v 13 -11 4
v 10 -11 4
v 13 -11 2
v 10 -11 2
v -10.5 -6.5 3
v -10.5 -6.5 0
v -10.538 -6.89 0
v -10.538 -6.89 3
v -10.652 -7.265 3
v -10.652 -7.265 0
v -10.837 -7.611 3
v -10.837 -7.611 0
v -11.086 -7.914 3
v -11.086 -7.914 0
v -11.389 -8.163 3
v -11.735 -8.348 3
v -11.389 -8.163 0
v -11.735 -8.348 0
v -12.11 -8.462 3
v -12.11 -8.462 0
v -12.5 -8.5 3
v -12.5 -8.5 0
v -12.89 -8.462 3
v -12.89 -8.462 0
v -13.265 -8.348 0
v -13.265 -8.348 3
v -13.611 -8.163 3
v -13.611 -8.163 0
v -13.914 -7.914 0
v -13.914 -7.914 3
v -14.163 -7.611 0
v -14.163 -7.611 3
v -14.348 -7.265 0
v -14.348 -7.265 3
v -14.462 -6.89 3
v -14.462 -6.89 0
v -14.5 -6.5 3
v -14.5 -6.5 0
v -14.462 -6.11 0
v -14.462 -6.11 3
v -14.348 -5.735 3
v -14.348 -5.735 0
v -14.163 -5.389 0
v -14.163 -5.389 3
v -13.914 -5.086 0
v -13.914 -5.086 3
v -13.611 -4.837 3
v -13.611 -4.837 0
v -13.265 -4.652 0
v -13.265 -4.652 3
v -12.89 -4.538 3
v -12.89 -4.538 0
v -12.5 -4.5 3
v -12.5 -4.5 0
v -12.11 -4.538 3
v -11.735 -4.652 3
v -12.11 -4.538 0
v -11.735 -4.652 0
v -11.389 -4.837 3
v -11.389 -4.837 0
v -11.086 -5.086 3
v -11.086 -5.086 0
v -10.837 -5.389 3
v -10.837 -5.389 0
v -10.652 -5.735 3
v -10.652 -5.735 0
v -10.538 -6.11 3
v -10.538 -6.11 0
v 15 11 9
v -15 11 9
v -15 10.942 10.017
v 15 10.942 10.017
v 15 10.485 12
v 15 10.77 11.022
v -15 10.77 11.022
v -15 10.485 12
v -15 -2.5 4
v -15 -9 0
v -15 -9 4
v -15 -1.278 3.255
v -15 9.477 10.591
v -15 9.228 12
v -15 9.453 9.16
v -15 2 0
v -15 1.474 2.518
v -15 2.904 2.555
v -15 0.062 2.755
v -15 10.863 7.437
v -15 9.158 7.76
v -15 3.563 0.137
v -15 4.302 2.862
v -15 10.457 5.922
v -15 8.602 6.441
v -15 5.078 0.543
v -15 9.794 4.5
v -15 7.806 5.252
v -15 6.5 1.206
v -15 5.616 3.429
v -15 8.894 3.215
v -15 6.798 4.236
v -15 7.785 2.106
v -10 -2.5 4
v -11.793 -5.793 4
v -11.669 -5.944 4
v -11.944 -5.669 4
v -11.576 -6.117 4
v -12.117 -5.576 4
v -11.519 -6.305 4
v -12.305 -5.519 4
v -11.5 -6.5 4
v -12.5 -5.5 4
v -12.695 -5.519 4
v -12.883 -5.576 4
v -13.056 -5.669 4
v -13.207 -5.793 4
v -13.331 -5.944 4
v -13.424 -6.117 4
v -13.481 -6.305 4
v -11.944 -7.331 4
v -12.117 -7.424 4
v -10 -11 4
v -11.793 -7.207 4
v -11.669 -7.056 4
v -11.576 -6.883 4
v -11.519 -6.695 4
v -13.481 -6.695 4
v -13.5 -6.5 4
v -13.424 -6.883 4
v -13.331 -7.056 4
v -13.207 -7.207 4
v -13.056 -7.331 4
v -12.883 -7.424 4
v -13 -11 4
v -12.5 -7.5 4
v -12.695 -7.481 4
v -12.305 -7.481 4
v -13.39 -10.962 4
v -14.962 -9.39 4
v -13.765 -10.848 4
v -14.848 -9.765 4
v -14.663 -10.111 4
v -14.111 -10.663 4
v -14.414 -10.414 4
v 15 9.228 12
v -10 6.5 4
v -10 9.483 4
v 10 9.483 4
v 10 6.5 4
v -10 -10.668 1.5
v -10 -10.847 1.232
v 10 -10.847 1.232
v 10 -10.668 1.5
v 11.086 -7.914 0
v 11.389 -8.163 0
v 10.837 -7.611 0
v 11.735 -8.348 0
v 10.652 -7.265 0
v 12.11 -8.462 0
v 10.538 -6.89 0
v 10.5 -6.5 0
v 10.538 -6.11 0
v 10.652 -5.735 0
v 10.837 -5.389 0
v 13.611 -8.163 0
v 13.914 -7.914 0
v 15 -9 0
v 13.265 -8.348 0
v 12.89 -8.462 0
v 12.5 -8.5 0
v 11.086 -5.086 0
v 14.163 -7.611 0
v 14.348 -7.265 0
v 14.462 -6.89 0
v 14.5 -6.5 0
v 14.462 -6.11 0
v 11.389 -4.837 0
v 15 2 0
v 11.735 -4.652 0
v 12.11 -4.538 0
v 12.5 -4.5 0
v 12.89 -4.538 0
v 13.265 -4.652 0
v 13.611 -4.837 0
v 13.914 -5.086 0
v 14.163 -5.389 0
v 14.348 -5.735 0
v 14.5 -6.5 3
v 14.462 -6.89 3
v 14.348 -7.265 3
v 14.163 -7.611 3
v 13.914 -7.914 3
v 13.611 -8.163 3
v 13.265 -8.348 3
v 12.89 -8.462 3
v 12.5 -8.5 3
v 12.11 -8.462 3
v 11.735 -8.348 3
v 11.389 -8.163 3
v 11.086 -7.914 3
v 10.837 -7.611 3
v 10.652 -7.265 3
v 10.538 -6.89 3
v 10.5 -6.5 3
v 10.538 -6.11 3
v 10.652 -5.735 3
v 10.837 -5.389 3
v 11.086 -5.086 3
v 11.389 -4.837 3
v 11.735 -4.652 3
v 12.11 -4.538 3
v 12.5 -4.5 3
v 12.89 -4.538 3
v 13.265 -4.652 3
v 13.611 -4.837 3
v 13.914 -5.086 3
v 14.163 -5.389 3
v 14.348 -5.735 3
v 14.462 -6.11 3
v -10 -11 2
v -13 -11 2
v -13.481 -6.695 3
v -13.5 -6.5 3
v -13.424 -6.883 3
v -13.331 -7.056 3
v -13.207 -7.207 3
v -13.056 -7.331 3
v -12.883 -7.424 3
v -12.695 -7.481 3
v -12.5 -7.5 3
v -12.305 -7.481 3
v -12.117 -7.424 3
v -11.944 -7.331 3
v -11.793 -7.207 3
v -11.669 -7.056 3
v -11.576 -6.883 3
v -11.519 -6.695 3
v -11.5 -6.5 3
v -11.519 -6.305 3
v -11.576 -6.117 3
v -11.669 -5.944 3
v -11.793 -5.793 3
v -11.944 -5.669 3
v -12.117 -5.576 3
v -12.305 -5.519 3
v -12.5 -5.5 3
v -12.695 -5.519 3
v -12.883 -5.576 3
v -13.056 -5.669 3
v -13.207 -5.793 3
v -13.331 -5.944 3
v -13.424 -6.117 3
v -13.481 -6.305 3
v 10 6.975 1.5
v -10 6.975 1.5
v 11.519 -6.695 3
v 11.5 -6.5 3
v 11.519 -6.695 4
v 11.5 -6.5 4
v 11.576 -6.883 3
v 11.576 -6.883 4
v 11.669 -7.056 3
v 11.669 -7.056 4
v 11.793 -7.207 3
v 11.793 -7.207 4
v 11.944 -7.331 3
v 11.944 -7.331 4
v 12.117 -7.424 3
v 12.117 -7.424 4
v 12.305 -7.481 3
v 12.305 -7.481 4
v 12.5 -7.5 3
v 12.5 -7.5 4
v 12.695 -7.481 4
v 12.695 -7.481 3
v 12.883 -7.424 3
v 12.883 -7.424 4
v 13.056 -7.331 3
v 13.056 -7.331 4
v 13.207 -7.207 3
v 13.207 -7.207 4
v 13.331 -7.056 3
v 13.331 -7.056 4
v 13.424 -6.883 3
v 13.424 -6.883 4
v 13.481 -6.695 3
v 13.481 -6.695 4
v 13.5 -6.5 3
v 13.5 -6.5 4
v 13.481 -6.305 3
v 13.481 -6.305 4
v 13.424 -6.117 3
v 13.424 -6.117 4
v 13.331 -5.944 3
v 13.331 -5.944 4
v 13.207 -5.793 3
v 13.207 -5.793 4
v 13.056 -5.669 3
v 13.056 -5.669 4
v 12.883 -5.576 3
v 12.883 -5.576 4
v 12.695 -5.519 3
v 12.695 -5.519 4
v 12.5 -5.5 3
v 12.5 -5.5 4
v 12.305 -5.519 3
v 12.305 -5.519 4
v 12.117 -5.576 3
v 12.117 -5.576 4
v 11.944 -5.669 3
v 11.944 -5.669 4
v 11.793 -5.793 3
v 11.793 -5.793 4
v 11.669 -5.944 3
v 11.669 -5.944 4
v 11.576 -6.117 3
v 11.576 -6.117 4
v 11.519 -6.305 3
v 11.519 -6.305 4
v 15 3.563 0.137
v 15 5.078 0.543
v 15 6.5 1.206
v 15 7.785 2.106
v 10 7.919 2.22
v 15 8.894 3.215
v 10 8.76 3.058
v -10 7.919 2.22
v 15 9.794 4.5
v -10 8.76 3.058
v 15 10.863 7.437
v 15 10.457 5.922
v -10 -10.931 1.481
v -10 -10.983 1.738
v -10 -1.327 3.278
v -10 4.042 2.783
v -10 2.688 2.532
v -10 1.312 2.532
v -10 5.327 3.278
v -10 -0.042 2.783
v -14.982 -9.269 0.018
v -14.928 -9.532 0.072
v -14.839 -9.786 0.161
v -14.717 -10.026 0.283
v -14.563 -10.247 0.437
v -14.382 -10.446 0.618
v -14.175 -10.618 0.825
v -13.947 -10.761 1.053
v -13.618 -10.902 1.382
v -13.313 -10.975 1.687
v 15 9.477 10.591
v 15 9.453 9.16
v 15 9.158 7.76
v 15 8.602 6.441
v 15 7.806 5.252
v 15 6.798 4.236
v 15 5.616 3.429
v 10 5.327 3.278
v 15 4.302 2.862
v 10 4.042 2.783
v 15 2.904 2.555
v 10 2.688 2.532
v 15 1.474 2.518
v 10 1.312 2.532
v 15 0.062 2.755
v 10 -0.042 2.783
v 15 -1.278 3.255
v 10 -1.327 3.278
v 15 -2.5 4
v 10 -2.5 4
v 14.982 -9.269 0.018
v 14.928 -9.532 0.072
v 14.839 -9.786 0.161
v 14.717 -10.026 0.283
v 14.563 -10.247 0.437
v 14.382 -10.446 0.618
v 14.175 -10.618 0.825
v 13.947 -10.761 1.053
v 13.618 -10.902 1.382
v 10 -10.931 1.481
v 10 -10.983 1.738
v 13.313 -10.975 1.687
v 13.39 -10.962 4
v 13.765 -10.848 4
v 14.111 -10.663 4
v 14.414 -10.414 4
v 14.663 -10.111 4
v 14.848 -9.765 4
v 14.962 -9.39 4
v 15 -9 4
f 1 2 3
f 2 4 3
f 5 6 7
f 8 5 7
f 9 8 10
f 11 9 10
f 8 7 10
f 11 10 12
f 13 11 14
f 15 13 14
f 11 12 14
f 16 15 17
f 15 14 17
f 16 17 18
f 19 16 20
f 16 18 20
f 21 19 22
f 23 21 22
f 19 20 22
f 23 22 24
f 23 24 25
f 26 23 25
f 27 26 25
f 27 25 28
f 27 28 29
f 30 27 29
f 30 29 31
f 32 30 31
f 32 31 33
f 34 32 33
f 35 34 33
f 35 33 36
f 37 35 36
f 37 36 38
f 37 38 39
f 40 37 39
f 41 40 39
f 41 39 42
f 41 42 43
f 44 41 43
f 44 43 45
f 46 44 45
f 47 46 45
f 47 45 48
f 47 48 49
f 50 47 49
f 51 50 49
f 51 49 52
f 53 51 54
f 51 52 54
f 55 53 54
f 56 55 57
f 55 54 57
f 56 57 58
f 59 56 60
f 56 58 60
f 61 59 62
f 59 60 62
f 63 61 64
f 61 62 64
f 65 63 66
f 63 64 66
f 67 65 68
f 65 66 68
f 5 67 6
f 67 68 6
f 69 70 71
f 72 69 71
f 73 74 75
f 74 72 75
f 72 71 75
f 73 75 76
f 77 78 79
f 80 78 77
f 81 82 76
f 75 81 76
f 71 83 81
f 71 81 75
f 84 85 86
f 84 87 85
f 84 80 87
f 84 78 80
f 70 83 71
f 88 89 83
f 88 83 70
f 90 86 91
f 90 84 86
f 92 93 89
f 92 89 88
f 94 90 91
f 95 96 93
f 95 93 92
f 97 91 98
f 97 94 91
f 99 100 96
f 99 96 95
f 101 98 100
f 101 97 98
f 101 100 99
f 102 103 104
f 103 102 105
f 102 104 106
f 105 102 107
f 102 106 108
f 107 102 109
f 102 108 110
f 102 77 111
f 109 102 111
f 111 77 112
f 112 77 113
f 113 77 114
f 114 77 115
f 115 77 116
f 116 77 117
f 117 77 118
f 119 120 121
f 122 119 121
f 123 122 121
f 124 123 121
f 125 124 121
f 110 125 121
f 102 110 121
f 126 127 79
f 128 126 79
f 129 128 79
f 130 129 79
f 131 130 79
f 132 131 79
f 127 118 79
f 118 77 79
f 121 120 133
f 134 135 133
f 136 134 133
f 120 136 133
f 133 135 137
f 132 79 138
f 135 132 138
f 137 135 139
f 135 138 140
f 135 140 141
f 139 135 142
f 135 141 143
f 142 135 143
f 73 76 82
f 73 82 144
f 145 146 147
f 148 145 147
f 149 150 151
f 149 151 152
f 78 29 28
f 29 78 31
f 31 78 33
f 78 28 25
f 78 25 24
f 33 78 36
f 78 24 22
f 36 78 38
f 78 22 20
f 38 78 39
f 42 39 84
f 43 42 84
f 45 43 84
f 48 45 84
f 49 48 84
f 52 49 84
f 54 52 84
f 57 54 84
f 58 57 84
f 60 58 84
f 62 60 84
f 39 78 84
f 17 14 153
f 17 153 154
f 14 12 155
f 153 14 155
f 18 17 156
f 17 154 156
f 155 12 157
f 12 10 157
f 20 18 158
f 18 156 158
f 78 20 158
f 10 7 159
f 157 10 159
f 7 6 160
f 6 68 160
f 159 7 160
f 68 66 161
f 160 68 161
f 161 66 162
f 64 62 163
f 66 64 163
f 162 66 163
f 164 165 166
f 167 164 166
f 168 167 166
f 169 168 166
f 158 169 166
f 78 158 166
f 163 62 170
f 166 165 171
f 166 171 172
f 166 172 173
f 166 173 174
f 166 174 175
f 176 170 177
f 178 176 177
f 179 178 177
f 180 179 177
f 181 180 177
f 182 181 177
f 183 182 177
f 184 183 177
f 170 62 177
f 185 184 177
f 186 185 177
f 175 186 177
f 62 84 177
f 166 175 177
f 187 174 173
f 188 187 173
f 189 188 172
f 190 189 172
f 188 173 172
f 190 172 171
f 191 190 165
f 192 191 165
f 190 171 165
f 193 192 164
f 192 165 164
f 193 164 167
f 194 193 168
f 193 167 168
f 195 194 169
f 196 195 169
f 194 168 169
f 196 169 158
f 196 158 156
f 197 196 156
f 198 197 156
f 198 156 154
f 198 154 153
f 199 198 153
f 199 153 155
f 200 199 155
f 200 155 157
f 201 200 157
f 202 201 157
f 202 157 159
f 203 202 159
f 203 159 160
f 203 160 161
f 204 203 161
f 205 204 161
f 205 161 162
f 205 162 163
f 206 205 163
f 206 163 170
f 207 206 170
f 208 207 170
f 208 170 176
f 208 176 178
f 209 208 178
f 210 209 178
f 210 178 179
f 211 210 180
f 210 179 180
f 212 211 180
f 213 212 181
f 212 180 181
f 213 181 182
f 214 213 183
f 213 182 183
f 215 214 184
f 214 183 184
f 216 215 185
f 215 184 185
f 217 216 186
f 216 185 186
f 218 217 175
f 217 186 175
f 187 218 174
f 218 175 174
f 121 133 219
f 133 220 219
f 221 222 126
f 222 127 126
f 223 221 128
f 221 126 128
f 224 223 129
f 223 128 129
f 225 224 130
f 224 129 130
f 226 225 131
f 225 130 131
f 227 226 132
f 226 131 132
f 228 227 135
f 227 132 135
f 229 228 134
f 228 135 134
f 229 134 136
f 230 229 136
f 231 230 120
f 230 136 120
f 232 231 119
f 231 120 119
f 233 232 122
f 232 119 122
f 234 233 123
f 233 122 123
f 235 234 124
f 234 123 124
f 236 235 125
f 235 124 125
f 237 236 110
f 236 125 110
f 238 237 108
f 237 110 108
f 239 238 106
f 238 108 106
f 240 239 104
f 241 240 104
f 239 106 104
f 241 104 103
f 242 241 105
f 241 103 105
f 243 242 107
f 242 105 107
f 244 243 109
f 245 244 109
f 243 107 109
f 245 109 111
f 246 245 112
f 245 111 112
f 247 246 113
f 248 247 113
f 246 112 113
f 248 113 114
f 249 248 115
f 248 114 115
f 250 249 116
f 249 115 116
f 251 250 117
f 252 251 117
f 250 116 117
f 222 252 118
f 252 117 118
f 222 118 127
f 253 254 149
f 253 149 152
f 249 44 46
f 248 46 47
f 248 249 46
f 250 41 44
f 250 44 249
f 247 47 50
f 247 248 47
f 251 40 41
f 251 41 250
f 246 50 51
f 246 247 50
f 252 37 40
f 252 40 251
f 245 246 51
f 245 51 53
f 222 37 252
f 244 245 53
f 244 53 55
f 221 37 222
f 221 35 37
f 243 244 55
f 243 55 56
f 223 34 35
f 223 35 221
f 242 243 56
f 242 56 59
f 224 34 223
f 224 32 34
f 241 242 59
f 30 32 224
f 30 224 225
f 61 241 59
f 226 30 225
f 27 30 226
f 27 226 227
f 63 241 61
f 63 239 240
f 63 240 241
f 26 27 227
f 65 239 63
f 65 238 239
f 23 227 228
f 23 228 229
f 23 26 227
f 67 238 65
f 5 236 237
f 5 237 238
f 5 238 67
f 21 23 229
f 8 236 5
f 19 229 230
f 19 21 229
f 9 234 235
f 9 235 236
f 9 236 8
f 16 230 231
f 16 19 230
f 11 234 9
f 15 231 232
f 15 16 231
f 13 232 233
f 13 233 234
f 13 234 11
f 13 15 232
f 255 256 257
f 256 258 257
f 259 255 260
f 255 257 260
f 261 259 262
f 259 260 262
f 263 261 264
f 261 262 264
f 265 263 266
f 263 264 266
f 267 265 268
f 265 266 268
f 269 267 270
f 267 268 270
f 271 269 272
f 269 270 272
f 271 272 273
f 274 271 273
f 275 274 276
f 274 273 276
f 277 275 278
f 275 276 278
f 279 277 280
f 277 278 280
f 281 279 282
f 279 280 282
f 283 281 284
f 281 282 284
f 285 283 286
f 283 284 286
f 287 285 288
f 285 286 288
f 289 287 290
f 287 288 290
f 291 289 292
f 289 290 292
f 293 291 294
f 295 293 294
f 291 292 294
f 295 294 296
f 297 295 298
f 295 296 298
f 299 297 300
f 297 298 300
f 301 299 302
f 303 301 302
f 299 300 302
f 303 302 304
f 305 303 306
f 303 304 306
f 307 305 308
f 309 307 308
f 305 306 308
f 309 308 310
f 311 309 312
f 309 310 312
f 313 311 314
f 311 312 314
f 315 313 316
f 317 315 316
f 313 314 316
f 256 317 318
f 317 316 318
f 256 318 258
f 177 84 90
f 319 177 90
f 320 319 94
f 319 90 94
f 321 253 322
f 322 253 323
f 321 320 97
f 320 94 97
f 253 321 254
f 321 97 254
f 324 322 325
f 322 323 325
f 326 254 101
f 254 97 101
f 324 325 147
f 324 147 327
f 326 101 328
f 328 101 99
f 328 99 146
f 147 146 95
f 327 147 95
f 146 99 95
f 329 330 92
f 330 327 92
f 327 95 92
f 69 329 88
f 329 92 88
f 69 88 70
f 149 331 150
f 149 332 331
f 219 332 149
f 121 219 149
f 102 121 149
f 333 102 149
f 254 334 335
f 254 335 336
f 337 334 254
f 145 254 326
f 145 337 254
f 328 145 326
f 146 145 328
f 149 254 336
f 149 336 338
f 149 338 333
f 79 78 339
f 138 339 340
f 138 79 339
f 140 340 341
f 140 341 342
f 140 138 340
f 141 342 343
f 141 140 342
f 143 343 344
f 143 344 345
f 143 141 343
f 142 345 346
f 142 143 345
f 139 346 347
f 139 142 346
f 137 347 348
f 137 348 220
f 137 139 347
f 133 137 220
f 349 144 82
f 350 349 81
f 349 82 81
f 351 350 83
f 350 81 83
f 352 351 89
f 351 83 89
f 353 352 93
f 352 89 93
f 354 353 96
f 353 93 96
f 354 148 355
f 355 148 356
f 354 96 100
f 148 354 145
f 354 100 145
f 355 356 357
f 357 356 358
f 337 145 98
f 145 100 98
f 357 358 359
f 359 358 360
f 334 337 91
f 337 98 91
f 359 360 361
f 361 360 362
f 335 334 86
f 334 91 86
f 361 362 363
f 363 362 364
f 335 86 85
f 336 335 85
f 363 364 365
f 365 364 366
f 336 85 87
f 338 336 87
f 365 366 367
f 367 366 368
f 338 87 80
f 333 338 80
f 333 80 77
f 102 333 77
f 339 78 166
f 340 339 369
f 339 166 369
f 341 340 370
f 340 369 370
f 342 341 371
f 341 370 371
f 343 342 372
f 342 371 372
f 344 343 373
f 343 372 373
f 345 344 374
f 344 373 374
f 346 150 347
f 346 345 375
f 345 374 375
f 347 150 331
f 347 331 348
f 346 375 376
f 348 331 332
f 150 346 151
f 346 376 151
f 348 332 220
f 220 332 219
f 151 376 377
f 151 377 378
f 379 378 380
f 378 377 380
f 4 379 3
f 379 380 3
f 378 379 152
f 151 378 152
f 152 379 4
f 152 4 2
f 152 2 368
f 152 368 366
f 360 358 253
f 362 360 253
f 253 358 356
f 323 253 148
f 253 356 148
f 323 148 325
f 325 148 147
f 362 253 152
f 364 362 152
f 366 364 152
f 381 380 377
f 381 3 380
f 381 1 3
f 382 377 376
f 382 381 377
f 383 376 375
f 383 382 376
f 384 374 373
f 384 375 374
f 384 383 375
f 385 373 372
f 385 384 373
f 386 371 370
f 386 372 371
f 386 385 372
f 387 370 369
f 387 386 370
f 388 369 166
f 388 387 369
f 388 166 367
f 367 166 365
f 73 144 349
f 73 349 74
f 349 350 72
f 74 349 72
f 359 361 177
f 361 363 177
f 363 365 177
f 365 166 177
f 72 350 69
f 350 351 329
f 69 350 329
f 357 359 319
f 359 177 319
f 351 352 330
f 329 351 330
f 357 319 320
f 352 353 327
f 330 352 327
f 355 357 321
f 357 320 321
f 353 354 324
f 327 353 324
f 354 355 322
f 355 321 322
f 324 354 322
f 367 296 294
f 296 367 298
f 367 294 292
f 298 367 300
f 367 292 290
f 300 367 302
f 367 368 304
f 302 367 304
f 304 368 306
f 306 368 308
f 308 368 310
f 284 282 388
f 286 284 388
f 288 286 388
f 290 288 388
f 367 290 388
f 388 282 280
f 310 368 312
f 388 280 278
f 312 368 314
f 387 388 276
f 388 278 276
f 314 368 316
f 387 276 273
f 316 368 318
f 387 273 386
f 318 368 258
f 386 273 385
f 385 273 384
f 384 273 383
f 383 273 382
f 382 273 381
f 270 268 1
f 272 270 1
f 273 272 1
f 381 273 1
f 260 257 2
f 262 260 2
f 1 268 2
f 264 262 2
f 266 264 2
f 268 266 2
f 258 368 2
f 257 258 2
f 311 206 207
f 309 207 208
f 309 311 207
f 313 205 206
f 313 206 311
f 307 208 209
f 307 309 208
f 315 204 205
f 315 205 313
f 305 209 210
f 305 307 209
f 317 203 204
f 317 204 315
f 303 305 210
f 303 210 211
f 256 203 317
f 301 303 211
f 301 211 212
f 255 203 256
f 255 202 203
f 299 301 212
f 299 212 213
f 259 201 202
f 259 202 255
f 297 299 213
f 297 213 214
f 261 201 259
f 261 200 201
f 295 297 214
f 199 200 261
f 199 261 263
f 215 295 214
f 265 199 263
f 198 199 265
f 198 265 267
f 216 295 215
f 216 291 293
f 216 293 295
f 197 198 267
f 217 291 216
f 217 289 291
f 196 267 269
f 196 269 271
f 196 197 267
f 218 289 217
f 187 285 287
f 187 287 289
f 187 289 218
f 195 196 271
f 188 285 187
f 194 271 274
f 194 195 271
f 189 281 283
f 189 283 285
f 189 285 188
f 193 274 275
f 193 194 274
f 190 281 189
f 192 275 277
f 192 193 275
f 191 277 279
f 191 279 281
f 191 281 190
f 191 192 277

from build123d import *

# Parameters (mm, degrees)
F0_W            = 30
F0_H            = 22
F1_DEPTH        = 12
F3_DEPTH        = 30.001
F3_DEPTH_BACK   = 25
F5_START        = -25
F5_DEPTH        = 40.001
F6_R            = 2
F7_W            = 20
F7_H            = 34.384613307
F8_DEPTH        = 2.5
F9_T1_DEPTH     = 20
F11_D           = 2
F11_DEPTH       = 8
F11_CBORE_D     = 4
F11_CBORE_DEPTH = 3
F11_TIP         = 0.600860619


# Not quite as in the source:
# - a fillet or chamfer that OpenCascade refuses, or shapes differently, is made with other operations: its cross-section is extruded or revolved along the edge and cut away or added


with BuildPart() as f1:
    # F0 (on Top) → F1 (new body)
    with BuildSketch(Plane.XY):
        Rectangle(F0_W, F0_H)
    extrude(amount=F1_DEPTH)

    # F2 (on face) → F3 (cut, two sides)
    with BuildSketch(Plane(origin=(-15, 0, 0), x_dir=(0, -1, 0), z_dir=(-1, 0, 0))) as f3_sk:
        with BuildLine():
            ThreePointArc((2.5, 4), (4.7082039325, 6.6458980338), (5.5, 10))
            ThreePointArc((5.5, 10), (3.3033008589, 15.3033008589), (-2, 17.5))
            Line((-2, 17.5), (-2, 4))
            Line((-2, 4), (2.5, 4))
        make_face()
        with BuildLine():
            ThreePointArc((-2, 17.5), (3.3033008589, 15.3033008589), (5.5, 10))
            ThreePointArc((5.5, 10), (4.7082039325, 6.6458980338), (2.5, 4))
            Line((2.5, 4), (15.6530104578, 4))
            Line((15.6530104578, 4), (15.6530104578, 18.6757147312))
            Line((15.6530104578, 18.6757147312), (-2, 18.6757147312))
            Line((-2, 18.6757147312), (-2, 17.5))
        make_face()
        with BuildLine():
            Line((-2, 4), (-2, 17.5))
            ThreePointArc((-2, 17.5), (-9.1151247354, 7.6282917549), (2.5, 4))
            Line((2.5, 4), (-2, 4))
        make_face()
    extrude(amount=-F3_DEPTH, mode=Mode.SUBTRACT)
    extrude(f3_sk.sketch, amount=F3_DEPTH_BACK, mode=Mode.SUBTRACT)

    # F4 (on Right) → F5 (intersect)
    with BuildSketch(Plane.YZ.offset(F5_START)):
        with BuildLine():
            ThreePointArc((2, 0), (8.3639610307, 2.6360389693), (11, 9))
            ThreePointArc((11, 9), (8.3639610307, 15.3639610307), (2, 18))
            Line((2, 18), (2, 0))
        make_face()
        with BuildLine():
            Line((2, 0), (2, 18))
            ThreePointArc((2, 18), (-7, 9), (2, 0))
        make_face()
        with BuildLine():
            ThreePointArc((2, 0), (-7, 9), (2, 18))
            Line((2, 18), (2, 22.4318560213))
            Line((2, 22.4318560213), (-24.2340825498, 22.4318560213))
            Line((-24.2340825498, 22.4318560213), (-24.2340825498, -9.0490430593))
            Line((-24.2340825498, -9.0490430593), (2, -9.0490430593))
            Line((2, -9.0490430593), (2, 0))
        make_face()
    extrude(amount=F5_DEPTH, mode=Mode.INTERSECT)

    # F6
    f6_edges = [f1.edges().sort_by_distance(p)[0] for p in [
        (0, -11, 0),
        (-15, -11, 2),
        (15, -11, 2),
    ]]
    fillet(f6_edges, radius=F6_R)

    # F7 (on face) → F8 (cut)
    with BuildSketch(Plane.XY.offset(4)):
        with Locations((0, -1.0834368877)):
            Rectangle(F7_W, F7_H)
    extrude(amount=-F8_DEPTH, mode=Mode.SUBTRACT)

    # F9: chamfer of 0.25 on 1 edges, made by hand

    # F9_s2 → F9_t1 (cut)
    with BuildSketch(Plane.YZ.offset(-10)):
        with BuildLine():
            Line((-10.8522111232, 1.2236697613), (-10.662309407, 1.5083186711))
            Line((-10.662309407, 1.5083186711), (-10.662309407, 1.5133186711))
            ThreePointArc((-10.662309407, 1.5133186711), (-10.7994005401, 1.505), (-10.9364916731, 1.505))
            Line((-10.9364916731, 1.505), (-10.9413329023, 1.49875))
            ThreePointArc((-10.9413329023, 1.49875), (-10.9000798671, 1.3599050861), (-10.8568277766, 1.2217497324))
            Line((-10.8568277766, 1.2217497324), (-10.8522111232, 1.2236697613))
        make_face()
    extrude(amount=F9_T1_DEPTH, mode=Mode.SUBTRACT)

    # F11
    with Locations(Plane(origin=(0, 0, 0), x_dir=(1, 0, 0), z_dir=(0, 0, -1))):
        with Locations((12.5, 6.5), (-12.5, 6.5)):
            CounterBoreHole(F11_D / 2, F11_CBORE_D / 2, F11_CBORE_DEPTH, depth=F11_DEPTH)
            with Locations((0, 0, -(F11_DEPTH + F11_TIP / 2))):  # 118° drill point
                Cone(0, F11_D / 2, F11_TIP, mode=Mode.SUBTRACT)


solid = f1.part
